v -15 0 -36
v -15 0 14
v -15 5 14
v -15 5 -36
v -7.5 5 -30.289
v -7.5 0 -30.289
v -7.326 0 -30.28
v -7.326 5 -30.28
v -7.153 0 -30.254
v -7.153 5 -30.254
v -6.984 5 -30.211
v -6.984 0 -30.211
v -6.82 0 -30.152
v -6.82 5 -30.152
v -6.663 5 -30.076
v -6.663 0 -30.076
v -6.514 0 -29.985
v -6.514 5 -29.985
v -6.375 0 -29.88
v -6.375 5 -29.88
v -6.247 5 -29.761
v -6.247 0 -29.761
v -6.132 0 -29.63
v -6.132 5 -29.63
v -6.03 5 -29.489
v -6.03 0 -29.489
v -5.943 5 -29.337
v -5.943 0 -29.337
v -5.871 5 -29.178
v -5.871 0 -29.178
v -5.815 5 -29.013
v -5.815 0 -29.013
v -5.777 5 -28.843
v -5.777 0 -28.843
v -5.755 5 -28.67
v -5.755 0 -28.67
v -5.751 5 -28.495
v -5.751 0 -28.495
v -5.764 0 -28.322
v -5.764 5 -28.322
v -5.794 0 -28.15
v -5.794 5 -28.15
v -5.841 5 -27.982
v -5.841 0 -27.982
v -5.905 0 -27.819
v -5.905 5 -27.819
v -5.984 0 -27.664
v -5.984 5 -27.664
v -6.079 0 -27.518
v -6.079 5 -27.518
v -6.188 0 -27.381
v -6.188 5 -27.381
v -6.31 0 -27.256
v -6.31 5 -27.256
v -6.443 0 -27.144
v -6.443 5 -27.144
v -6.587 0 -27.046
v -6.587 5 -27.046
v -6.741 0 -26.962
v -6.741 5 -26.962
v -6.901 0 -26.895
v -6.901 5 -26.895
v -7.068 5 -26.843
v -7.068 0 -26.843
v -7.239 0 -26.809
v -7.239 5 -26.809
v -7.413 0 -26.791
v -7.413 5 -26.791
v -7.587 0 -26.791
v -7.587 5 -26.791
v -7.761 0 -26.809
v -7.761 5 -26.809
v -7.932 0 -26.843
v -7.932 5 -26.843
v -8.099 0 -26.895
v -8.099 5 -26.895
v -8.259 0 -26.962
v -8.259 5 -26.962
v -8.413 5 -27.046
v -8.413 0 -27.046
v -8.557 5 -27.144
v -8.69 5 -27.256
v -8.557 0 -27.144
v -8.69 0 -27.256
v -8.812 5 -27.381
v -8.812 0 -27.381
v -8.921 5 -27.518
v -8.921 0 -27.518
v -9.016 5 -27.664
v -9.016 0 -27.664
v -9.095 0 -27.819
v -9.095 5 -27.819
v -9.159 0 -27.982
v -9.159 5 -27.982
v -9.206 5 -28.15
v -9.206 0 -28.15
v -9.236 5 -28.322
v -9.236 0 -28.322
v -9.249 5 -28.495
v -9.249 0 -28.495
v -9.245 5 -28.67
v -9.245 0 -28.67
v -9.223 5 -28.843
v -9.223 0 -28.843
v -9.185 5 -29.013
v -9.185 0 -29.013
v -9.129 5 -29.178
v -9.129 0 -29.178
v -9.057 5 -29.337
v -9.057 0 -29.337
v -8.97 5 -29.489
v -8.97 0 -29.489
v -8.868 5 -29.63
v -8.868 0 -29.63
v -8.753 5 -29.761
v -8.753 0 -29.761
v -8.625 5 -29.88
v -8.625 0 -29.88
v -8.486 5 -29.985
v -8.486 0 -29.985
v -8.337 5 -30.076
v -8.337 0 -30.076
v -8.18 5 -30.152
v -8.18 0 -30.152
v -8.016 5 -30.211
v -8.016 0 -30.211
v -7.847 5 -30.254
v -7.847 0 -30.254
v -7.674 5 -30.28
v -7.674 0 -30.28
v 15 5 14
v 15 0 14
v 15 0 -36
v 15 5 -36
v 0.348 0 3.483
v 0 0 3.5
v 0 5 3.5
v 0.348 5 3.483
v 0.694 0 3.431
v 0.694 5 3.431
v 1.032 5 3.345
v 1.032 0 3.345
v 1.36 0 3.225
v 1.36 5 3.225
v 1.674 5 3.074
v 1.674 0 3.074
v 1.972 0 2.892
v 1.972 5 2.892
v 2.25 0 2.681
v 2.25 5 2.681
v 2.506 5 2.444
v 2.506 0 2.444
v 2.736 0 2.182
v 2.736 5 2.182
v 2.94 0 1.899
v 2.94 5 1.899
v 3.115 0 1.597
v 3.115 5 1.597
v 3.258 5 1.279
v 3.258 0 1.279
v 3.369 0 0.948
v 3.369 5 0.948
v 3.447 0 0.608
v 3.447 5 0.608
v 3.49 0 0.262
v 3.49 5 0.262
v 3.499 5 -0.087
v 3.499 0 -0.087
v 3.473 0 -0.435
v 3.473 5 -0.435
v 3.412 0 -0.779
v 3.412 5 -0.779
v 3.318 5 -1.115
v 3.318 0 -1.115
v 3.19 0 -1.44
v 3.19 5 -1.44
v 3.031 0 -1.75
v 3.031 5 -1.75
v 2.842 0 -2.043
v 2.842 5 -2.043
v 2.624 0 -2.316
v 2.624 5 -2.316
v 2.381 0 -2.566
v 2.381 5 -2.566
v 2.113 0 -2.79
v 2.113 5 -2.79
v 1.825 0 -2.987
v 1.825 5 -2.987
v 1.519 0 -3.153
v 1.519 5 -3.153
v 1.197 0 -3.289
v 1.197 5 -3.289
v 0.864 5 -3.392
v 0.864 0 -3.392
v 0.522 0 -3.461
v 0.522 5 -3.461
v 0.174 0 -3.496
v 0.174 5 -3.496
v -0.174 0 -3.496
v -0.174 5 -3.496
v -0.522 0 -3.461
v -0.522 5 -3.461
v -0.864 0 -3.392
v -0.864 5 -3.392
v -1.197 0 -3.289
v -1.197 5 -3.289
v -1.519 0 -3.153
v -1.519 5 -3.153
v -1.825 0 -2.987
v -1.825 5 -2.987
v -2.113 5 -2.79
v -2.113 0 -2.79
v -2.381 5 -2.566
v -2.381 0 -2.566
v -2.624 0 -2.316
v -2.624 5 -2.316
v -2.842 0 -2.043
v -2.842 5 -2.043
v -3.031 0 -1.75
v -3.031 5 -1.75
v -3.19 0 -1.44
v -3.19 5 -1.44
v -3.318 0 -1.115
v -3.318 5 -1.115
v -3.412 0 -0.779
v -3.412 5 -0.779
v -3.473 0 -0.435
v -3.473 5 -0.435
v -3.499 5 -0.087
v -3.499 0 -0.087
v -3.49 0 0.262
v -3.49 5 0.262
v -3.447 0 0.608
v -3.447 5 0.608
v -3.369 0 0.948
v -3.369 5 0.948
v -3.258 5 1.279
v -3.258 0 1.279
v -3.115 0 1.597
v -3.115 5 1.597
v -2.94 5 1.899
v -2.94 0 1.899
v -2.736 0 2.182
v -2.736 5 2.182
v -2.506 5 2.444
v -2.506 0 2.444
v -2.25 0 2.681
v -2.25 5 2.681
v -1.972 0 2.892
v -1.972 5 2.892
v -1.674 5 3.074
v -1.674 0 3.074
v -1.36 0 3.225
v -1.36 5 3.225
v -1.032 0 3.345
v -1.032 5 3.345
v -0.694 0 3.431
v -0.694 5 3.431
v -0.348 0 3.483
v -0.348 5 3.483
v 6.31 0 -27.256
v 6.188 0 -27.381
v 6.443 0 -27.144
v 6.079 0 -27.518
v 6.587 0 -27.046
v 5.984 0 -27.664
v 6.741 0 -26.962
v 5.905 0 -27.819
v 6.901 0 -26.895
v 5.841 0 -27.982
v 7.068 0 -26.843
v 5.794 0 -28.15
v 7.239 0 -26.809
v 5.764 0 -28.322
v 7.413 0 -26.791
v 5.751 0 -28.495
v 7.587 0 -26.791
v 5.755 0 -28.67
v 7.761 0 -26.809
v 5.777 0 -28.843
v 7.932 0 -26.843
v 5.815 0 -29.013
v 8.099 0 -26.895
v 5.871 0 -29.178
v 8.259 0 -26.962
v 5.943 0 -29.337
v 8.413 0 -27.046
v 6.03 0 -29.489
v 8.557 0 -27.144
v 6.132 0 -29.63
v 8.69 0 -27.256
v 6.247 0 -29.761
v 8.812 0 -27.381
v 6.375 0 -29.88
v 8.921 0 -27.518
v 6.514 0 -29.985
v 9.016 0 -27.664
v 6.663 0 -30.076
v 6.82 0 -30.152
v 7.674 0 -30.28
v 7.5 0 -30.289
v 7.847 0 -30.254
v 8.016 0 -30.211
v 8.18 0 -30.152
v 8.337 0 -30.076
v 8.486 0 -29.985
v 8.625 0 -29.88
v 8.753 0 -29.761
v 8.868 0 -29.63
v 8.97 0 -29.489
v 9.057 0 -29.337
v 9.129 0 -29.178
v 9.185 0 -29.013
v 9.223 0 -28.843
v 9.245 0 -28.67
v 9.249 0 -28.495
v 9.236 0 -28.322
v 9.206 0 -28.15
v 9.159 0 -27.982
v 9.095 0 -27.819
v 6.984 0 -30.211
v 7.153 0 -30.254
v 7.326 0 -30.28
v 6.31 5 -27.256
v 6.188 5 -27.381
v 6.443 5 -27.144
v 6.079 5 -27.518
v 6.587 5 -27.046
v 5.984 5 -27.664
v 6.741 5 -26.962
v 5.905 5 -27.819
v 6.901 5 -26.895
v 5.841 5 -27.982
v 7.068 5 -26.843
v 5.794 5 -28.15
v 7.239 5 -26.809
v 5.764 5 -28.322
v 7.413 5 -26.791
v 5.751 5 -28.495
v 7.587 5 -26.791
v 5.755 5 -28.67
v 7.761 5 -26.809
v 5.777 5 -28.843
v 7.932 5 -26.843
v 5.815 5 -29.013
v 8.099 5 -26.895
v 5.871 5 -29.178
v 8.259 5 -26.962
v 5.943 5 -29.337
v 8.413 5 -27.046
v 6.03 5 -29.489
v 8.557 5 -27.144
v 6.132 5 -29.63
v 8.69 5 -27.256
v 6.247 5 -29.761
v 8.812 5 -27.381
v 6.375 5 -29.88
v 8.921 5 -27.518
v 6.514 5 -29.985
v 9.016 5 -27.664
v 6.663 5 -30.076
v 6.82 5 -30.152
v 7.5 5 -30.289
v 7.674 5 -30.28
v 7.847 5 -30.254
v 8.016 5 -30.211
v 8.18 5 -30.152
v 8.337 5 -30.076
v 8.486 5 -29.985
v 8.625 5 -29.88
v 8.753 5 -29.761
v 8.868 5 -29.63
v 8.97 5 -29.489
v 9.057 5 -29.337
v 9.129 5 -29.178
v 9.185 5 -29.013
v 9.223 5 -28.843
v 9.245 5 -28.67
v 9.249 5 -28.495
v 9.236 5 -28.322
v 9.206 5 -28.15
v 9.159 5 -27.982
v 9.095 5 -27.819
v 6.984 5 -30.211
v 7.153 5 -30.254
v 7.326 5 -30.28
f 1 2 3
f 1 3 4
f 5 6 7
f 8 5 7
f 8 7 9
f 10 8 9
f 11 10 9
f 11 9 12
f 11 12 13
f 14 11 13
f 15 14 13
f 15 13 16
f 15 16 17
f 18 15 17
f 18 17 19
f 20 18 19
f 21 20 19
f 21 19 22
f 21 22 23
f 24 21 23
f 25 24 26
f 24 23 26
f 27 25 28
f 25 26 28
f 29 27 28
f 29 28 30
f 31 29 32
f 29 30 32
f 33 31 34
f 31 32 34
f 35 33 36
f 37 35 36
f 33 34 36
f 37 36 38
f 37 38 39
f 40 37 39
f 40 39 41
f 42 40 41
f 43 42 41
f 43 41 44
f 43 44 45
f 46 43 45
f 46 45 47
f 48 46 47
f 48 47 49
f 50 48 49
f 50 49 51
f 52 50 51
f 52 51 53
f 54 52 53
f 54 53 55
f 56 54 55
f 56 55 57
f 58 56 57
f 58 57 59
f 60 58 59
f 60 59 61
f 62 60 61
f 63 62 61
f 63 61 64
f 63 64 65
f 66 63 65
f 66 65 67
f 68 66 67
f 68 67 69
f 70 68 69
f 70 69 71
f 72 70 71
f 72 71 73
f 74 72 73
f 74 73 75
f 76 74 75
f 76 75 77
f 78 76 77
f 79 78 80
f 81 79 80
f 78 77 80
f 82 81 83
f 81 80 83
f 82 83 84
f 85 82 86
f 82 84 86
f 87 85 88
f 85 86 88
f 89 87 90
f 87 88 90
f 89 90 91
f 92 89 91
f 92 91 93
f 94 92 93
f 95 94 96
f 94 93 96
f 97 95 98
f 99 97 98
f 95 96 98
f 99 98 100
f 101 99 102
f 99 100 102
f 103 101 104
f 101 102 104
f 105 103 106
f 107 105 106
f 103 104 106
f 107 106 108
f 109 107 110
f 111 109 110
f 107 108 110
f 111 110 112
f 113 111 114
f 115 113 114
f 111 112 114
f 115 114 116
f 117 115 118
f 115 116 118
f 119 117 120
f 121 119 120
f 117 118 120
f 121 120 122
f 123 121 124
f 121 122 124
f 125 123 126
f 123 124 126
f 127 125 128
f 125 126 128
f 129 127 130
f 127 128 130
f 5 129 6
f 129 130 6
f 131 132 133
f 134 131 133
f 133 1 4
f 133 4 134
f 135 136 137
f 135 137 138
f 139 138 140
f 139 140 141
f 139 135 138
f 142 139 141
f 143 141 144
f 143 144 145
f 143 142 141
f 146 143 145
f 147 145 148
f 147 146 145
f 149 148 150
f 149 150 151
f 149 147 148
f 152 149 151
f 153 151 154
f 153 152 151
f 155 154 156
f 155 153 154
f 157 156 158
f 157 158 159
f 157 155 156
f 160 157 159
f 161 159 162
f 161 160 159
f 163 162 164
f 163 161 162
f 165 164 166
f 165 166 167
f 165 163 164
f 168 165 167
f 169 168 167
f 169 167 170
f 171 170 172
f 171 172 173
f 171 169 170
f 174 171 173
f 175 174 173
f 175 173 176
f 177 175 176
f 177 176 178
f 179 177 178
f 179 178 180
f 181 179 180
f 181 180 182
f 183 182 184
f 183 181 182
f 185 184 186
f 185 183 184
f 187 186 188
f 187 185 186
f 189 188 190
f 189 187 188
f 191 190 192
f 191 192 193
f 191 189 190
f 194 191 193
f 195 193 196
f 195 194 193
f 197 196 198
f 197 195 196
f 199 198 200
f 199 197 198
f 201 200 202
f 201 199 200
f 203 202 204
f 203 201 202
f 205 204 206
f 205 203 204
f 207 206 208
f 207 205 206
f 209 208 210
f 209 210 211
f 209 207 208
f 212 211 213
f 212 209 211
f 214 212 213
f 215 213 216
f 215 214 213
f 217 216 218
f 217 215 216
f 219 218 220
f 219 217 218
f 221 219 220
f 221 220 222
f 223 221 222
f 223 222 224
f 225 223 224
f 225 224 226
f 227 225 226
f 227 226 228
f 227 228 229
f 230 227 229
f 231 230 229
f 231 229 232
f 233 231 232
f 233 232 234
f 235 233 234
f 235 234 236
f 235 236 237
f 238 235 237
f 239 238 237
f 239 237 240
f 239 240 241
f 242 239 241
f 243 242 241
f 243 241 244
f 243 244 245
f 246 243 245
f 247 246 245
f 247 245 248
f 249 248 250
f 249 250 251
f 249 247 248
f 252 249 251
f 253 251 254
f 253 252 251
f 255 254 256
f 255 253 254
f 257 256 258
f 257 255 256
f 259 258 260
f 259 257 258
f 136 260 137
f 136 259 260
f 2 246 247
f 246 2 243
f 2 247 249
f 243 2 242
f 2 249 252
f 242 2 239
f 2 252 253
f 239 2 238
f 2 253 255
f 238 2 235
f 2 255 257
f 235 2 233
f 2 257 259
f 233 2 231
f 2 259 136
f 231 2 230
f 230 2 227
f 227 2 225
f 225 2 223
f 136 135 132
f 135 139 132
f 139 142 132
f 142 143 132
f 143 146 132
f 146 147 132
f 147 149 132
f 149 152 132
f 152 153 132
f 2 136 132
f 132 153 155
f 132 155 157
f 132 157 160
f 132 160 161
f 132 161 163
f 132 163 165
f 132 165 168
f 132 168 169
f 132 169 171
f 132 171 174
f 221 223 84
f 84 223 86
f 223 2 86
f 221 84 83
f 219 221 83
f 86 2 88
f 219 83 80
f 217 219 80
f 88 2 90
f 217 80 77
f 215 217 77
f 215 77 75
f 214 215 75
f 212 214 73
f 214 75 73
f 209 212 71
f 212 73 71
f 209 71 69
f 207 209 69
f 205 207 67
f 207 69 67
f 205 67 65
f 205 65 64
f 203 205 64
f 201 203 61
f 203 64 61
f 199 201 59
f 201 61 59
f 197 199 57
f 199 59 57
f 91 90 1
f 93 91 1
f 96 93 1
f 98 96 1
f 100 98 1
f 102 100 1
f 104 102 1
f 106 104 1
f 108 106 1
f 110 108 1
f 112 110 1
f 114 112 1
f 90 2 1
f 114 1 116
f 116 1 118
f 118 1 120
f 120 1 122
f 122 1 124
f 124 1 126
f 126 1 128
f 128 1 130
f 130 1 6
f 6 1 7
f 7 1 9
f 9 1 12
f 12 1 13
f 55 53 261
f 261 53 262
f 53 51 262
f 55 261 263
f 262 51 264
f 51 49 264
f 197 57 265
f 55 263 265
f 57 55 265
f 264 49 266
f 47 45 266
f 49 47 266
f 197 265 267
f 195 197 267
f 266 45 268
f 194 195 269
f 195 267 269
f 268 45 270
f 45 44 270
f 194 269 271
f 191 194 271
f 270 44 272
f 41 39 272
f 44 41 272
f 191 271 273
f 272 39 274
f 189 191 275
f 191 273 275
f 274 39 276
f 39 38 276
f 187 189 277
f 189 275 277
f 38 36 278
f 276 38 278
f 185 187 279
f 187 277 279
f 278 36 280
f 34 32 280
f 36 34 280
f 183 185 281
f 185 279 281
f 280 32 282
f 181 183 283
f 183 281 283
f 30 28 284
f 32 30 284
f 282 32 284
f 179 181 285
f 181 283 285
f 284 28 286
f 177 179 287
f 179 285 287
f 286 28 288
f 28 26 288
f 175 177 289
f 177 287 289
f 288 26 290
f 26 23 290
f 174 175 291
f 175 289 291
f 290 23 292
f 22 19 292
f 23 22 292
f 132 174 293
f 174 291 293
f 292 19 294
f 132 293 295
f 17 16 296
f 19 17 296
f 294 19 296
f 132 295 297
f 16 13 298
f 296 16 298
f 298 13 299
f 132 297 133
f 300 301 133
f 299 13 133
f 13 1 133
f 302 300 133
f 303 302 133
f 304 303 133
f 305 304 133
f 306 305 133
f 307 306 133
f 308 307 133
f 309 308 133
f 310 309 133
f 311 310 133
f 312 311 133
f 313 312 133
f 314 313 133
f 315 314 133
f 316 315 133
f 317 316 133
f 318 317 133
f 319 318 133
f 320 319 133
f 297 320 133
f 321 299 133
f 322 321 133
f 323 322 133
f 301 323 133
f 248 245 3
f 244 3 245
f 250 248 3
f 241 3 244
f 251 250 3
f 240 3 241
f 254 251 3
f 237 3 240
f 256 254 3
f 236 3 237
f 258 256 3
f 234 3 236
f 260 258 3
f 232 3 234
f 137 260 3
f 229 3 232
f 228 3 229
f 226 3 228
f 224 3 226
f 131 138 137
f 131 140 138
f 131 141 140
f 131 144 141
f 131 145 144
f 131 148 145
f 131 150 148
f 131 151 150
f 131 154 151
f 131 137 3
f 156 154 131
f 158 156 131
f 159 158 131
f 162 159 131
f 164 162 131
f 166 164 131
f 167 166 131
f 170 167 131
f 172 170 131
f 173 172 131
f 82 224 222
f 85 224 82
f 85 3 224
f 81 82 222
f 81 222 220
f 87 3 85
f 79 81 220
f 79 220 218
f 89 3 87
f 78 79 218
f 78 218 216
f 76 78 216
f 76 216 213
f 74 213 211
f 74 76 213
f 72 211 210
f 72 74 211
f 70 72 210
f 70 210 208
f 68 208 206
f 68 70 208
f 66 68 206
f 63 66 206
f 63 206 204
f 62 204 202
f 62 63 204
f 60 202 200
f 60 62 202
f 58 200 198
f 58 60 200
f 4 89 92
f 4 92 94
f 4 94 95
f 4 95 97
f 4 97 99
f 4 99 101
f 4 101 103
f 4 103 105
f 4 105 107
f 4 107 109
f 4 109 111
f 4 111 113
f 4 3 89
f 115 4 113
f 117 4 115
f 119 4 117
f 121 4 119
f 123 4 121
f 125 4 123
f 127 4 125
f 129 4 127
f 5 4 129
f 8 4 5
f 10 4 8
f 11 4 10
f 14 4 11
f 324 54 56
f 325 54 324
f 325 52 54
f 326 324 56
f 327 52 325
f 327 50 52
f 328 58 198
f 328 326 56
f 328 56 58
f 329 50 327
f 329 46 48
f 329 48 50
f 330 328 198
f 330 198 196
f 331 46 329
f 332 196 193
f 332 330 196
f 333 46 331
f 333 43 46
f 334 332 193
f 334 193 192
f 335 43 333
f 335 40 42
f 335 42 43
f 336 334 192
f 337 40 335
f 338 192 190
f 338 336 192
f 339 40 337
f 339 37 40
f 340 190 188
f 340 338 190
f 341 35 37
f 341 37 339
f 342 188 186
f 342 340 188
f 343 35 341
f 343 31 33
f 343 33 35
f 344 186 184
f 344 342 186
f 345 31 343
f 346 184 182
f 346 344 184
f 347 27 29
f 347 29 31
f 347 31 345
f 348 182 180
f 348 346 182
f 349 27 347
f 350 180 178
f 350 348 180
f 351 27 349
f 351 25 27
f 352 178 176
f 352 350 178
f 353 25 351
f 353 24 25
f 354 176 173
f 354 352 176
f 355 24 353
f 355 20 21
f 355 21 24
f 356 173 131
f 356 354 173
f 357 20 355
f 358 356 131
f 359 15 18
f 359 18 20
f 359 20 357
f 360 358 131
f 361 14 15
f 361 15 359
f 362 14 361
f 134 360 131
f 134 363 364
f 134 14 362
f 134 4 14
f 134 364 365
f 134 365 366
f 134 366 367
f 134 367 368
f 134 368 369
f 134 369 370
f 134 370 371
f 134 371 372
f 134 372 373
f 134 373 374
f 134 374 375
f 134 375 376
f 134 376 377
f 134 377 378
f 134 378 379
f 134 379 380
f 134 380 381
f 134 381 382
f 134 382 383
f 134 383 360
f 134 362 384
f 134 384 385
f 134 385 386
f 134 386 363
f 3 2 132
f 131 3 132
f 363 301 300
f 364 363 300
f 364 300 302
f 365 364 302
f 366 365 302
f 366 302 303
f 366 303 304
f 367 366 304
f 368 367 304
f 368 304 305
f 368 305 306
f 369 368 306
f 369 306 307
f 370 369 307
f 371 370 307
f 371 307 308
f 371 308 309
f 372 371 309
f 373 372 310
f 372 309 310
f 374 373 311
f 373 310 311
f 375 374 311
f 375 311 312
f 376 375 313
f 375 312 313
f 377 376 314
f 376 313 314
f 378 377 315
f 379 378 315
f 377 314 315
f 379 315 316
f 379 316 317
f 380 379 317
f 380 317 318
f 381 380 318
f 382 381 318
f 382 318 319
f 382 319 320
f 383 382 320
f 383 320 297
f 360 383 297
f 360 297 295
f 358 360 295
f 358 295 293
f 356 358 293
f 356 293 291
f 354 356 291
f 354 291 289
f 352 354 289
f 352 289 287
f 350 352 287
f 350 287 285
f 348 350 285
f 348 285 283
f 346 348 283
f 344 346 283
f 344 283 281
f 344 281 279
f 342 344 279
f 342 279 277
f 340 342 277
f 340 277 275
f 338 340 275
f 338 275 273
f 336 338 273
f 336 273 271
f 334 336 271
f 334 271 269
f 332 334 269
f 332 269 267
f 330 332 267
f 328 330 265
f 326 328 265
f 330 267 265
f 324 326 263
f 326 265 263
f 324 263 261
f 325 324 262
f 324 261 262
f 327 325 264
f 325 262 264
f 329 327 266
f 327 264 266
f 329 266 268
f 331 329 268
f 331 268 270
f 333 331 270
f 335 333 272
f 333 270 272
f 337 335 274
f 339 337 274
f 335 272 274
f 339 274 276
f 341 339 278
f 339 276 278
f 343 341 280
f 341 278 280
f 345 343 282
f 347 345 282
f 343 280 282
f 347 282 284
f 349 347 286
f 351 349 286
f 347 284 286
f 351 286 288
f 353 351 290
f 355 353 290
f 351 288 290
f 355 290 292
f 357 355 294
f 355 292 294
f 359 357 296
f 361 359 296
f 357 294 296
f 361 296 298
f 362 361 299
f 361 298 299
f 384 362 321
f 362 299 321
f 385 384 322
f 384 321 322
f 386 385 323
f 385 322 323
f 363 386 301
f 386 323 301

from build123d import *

# Parameters (mm, degrees)
SKETCH_2_W          = 30
SKETCH_2_H          = 50
SKETCH_2_R          = 3.5
EXTRUDE_1_DEPTH     = 5
SKETCH_4_R          = 1.75
CUT_EXTRUDE_1_DEPTH = 10


with BuildPart() as part:
    # 스케치2 → 보스-돌출1 (new body)
    with BuildSketch(Plane(origin=(0, 0, 0), x_dir=(1, 0, 0), z_dir=(0, 1, 0))):
        with Locations((0, 11)):
            Rectangle(SKETCH_2_W, SKETCH_2_H)
        with Locations(Location((0, 0, 0), (0, 0, 270))):
            Circle(SKETCH_2_R, mode=Mode.SUBTRACT)
    extrude(amount=EXTRUDE_1_DEPTH)

    # 스케치4 → 컷-돌출1 (cut)
    with BuildSketch(Plane.XZ):
        with Locations(Location((7.5, -28.539103593, 0), (0, 0, 270))):
            Circle(SKETCH_4_R)
        with Locations(Location((-7.5, -28.539103593, 0), (0, 0, 270))):
            Circle(SKETCH_4_R)
    extrude(amount=-CUT_EXTRUDE_1_DEPTH, mode=Mode.SUBTRACT)


solid = part.part
